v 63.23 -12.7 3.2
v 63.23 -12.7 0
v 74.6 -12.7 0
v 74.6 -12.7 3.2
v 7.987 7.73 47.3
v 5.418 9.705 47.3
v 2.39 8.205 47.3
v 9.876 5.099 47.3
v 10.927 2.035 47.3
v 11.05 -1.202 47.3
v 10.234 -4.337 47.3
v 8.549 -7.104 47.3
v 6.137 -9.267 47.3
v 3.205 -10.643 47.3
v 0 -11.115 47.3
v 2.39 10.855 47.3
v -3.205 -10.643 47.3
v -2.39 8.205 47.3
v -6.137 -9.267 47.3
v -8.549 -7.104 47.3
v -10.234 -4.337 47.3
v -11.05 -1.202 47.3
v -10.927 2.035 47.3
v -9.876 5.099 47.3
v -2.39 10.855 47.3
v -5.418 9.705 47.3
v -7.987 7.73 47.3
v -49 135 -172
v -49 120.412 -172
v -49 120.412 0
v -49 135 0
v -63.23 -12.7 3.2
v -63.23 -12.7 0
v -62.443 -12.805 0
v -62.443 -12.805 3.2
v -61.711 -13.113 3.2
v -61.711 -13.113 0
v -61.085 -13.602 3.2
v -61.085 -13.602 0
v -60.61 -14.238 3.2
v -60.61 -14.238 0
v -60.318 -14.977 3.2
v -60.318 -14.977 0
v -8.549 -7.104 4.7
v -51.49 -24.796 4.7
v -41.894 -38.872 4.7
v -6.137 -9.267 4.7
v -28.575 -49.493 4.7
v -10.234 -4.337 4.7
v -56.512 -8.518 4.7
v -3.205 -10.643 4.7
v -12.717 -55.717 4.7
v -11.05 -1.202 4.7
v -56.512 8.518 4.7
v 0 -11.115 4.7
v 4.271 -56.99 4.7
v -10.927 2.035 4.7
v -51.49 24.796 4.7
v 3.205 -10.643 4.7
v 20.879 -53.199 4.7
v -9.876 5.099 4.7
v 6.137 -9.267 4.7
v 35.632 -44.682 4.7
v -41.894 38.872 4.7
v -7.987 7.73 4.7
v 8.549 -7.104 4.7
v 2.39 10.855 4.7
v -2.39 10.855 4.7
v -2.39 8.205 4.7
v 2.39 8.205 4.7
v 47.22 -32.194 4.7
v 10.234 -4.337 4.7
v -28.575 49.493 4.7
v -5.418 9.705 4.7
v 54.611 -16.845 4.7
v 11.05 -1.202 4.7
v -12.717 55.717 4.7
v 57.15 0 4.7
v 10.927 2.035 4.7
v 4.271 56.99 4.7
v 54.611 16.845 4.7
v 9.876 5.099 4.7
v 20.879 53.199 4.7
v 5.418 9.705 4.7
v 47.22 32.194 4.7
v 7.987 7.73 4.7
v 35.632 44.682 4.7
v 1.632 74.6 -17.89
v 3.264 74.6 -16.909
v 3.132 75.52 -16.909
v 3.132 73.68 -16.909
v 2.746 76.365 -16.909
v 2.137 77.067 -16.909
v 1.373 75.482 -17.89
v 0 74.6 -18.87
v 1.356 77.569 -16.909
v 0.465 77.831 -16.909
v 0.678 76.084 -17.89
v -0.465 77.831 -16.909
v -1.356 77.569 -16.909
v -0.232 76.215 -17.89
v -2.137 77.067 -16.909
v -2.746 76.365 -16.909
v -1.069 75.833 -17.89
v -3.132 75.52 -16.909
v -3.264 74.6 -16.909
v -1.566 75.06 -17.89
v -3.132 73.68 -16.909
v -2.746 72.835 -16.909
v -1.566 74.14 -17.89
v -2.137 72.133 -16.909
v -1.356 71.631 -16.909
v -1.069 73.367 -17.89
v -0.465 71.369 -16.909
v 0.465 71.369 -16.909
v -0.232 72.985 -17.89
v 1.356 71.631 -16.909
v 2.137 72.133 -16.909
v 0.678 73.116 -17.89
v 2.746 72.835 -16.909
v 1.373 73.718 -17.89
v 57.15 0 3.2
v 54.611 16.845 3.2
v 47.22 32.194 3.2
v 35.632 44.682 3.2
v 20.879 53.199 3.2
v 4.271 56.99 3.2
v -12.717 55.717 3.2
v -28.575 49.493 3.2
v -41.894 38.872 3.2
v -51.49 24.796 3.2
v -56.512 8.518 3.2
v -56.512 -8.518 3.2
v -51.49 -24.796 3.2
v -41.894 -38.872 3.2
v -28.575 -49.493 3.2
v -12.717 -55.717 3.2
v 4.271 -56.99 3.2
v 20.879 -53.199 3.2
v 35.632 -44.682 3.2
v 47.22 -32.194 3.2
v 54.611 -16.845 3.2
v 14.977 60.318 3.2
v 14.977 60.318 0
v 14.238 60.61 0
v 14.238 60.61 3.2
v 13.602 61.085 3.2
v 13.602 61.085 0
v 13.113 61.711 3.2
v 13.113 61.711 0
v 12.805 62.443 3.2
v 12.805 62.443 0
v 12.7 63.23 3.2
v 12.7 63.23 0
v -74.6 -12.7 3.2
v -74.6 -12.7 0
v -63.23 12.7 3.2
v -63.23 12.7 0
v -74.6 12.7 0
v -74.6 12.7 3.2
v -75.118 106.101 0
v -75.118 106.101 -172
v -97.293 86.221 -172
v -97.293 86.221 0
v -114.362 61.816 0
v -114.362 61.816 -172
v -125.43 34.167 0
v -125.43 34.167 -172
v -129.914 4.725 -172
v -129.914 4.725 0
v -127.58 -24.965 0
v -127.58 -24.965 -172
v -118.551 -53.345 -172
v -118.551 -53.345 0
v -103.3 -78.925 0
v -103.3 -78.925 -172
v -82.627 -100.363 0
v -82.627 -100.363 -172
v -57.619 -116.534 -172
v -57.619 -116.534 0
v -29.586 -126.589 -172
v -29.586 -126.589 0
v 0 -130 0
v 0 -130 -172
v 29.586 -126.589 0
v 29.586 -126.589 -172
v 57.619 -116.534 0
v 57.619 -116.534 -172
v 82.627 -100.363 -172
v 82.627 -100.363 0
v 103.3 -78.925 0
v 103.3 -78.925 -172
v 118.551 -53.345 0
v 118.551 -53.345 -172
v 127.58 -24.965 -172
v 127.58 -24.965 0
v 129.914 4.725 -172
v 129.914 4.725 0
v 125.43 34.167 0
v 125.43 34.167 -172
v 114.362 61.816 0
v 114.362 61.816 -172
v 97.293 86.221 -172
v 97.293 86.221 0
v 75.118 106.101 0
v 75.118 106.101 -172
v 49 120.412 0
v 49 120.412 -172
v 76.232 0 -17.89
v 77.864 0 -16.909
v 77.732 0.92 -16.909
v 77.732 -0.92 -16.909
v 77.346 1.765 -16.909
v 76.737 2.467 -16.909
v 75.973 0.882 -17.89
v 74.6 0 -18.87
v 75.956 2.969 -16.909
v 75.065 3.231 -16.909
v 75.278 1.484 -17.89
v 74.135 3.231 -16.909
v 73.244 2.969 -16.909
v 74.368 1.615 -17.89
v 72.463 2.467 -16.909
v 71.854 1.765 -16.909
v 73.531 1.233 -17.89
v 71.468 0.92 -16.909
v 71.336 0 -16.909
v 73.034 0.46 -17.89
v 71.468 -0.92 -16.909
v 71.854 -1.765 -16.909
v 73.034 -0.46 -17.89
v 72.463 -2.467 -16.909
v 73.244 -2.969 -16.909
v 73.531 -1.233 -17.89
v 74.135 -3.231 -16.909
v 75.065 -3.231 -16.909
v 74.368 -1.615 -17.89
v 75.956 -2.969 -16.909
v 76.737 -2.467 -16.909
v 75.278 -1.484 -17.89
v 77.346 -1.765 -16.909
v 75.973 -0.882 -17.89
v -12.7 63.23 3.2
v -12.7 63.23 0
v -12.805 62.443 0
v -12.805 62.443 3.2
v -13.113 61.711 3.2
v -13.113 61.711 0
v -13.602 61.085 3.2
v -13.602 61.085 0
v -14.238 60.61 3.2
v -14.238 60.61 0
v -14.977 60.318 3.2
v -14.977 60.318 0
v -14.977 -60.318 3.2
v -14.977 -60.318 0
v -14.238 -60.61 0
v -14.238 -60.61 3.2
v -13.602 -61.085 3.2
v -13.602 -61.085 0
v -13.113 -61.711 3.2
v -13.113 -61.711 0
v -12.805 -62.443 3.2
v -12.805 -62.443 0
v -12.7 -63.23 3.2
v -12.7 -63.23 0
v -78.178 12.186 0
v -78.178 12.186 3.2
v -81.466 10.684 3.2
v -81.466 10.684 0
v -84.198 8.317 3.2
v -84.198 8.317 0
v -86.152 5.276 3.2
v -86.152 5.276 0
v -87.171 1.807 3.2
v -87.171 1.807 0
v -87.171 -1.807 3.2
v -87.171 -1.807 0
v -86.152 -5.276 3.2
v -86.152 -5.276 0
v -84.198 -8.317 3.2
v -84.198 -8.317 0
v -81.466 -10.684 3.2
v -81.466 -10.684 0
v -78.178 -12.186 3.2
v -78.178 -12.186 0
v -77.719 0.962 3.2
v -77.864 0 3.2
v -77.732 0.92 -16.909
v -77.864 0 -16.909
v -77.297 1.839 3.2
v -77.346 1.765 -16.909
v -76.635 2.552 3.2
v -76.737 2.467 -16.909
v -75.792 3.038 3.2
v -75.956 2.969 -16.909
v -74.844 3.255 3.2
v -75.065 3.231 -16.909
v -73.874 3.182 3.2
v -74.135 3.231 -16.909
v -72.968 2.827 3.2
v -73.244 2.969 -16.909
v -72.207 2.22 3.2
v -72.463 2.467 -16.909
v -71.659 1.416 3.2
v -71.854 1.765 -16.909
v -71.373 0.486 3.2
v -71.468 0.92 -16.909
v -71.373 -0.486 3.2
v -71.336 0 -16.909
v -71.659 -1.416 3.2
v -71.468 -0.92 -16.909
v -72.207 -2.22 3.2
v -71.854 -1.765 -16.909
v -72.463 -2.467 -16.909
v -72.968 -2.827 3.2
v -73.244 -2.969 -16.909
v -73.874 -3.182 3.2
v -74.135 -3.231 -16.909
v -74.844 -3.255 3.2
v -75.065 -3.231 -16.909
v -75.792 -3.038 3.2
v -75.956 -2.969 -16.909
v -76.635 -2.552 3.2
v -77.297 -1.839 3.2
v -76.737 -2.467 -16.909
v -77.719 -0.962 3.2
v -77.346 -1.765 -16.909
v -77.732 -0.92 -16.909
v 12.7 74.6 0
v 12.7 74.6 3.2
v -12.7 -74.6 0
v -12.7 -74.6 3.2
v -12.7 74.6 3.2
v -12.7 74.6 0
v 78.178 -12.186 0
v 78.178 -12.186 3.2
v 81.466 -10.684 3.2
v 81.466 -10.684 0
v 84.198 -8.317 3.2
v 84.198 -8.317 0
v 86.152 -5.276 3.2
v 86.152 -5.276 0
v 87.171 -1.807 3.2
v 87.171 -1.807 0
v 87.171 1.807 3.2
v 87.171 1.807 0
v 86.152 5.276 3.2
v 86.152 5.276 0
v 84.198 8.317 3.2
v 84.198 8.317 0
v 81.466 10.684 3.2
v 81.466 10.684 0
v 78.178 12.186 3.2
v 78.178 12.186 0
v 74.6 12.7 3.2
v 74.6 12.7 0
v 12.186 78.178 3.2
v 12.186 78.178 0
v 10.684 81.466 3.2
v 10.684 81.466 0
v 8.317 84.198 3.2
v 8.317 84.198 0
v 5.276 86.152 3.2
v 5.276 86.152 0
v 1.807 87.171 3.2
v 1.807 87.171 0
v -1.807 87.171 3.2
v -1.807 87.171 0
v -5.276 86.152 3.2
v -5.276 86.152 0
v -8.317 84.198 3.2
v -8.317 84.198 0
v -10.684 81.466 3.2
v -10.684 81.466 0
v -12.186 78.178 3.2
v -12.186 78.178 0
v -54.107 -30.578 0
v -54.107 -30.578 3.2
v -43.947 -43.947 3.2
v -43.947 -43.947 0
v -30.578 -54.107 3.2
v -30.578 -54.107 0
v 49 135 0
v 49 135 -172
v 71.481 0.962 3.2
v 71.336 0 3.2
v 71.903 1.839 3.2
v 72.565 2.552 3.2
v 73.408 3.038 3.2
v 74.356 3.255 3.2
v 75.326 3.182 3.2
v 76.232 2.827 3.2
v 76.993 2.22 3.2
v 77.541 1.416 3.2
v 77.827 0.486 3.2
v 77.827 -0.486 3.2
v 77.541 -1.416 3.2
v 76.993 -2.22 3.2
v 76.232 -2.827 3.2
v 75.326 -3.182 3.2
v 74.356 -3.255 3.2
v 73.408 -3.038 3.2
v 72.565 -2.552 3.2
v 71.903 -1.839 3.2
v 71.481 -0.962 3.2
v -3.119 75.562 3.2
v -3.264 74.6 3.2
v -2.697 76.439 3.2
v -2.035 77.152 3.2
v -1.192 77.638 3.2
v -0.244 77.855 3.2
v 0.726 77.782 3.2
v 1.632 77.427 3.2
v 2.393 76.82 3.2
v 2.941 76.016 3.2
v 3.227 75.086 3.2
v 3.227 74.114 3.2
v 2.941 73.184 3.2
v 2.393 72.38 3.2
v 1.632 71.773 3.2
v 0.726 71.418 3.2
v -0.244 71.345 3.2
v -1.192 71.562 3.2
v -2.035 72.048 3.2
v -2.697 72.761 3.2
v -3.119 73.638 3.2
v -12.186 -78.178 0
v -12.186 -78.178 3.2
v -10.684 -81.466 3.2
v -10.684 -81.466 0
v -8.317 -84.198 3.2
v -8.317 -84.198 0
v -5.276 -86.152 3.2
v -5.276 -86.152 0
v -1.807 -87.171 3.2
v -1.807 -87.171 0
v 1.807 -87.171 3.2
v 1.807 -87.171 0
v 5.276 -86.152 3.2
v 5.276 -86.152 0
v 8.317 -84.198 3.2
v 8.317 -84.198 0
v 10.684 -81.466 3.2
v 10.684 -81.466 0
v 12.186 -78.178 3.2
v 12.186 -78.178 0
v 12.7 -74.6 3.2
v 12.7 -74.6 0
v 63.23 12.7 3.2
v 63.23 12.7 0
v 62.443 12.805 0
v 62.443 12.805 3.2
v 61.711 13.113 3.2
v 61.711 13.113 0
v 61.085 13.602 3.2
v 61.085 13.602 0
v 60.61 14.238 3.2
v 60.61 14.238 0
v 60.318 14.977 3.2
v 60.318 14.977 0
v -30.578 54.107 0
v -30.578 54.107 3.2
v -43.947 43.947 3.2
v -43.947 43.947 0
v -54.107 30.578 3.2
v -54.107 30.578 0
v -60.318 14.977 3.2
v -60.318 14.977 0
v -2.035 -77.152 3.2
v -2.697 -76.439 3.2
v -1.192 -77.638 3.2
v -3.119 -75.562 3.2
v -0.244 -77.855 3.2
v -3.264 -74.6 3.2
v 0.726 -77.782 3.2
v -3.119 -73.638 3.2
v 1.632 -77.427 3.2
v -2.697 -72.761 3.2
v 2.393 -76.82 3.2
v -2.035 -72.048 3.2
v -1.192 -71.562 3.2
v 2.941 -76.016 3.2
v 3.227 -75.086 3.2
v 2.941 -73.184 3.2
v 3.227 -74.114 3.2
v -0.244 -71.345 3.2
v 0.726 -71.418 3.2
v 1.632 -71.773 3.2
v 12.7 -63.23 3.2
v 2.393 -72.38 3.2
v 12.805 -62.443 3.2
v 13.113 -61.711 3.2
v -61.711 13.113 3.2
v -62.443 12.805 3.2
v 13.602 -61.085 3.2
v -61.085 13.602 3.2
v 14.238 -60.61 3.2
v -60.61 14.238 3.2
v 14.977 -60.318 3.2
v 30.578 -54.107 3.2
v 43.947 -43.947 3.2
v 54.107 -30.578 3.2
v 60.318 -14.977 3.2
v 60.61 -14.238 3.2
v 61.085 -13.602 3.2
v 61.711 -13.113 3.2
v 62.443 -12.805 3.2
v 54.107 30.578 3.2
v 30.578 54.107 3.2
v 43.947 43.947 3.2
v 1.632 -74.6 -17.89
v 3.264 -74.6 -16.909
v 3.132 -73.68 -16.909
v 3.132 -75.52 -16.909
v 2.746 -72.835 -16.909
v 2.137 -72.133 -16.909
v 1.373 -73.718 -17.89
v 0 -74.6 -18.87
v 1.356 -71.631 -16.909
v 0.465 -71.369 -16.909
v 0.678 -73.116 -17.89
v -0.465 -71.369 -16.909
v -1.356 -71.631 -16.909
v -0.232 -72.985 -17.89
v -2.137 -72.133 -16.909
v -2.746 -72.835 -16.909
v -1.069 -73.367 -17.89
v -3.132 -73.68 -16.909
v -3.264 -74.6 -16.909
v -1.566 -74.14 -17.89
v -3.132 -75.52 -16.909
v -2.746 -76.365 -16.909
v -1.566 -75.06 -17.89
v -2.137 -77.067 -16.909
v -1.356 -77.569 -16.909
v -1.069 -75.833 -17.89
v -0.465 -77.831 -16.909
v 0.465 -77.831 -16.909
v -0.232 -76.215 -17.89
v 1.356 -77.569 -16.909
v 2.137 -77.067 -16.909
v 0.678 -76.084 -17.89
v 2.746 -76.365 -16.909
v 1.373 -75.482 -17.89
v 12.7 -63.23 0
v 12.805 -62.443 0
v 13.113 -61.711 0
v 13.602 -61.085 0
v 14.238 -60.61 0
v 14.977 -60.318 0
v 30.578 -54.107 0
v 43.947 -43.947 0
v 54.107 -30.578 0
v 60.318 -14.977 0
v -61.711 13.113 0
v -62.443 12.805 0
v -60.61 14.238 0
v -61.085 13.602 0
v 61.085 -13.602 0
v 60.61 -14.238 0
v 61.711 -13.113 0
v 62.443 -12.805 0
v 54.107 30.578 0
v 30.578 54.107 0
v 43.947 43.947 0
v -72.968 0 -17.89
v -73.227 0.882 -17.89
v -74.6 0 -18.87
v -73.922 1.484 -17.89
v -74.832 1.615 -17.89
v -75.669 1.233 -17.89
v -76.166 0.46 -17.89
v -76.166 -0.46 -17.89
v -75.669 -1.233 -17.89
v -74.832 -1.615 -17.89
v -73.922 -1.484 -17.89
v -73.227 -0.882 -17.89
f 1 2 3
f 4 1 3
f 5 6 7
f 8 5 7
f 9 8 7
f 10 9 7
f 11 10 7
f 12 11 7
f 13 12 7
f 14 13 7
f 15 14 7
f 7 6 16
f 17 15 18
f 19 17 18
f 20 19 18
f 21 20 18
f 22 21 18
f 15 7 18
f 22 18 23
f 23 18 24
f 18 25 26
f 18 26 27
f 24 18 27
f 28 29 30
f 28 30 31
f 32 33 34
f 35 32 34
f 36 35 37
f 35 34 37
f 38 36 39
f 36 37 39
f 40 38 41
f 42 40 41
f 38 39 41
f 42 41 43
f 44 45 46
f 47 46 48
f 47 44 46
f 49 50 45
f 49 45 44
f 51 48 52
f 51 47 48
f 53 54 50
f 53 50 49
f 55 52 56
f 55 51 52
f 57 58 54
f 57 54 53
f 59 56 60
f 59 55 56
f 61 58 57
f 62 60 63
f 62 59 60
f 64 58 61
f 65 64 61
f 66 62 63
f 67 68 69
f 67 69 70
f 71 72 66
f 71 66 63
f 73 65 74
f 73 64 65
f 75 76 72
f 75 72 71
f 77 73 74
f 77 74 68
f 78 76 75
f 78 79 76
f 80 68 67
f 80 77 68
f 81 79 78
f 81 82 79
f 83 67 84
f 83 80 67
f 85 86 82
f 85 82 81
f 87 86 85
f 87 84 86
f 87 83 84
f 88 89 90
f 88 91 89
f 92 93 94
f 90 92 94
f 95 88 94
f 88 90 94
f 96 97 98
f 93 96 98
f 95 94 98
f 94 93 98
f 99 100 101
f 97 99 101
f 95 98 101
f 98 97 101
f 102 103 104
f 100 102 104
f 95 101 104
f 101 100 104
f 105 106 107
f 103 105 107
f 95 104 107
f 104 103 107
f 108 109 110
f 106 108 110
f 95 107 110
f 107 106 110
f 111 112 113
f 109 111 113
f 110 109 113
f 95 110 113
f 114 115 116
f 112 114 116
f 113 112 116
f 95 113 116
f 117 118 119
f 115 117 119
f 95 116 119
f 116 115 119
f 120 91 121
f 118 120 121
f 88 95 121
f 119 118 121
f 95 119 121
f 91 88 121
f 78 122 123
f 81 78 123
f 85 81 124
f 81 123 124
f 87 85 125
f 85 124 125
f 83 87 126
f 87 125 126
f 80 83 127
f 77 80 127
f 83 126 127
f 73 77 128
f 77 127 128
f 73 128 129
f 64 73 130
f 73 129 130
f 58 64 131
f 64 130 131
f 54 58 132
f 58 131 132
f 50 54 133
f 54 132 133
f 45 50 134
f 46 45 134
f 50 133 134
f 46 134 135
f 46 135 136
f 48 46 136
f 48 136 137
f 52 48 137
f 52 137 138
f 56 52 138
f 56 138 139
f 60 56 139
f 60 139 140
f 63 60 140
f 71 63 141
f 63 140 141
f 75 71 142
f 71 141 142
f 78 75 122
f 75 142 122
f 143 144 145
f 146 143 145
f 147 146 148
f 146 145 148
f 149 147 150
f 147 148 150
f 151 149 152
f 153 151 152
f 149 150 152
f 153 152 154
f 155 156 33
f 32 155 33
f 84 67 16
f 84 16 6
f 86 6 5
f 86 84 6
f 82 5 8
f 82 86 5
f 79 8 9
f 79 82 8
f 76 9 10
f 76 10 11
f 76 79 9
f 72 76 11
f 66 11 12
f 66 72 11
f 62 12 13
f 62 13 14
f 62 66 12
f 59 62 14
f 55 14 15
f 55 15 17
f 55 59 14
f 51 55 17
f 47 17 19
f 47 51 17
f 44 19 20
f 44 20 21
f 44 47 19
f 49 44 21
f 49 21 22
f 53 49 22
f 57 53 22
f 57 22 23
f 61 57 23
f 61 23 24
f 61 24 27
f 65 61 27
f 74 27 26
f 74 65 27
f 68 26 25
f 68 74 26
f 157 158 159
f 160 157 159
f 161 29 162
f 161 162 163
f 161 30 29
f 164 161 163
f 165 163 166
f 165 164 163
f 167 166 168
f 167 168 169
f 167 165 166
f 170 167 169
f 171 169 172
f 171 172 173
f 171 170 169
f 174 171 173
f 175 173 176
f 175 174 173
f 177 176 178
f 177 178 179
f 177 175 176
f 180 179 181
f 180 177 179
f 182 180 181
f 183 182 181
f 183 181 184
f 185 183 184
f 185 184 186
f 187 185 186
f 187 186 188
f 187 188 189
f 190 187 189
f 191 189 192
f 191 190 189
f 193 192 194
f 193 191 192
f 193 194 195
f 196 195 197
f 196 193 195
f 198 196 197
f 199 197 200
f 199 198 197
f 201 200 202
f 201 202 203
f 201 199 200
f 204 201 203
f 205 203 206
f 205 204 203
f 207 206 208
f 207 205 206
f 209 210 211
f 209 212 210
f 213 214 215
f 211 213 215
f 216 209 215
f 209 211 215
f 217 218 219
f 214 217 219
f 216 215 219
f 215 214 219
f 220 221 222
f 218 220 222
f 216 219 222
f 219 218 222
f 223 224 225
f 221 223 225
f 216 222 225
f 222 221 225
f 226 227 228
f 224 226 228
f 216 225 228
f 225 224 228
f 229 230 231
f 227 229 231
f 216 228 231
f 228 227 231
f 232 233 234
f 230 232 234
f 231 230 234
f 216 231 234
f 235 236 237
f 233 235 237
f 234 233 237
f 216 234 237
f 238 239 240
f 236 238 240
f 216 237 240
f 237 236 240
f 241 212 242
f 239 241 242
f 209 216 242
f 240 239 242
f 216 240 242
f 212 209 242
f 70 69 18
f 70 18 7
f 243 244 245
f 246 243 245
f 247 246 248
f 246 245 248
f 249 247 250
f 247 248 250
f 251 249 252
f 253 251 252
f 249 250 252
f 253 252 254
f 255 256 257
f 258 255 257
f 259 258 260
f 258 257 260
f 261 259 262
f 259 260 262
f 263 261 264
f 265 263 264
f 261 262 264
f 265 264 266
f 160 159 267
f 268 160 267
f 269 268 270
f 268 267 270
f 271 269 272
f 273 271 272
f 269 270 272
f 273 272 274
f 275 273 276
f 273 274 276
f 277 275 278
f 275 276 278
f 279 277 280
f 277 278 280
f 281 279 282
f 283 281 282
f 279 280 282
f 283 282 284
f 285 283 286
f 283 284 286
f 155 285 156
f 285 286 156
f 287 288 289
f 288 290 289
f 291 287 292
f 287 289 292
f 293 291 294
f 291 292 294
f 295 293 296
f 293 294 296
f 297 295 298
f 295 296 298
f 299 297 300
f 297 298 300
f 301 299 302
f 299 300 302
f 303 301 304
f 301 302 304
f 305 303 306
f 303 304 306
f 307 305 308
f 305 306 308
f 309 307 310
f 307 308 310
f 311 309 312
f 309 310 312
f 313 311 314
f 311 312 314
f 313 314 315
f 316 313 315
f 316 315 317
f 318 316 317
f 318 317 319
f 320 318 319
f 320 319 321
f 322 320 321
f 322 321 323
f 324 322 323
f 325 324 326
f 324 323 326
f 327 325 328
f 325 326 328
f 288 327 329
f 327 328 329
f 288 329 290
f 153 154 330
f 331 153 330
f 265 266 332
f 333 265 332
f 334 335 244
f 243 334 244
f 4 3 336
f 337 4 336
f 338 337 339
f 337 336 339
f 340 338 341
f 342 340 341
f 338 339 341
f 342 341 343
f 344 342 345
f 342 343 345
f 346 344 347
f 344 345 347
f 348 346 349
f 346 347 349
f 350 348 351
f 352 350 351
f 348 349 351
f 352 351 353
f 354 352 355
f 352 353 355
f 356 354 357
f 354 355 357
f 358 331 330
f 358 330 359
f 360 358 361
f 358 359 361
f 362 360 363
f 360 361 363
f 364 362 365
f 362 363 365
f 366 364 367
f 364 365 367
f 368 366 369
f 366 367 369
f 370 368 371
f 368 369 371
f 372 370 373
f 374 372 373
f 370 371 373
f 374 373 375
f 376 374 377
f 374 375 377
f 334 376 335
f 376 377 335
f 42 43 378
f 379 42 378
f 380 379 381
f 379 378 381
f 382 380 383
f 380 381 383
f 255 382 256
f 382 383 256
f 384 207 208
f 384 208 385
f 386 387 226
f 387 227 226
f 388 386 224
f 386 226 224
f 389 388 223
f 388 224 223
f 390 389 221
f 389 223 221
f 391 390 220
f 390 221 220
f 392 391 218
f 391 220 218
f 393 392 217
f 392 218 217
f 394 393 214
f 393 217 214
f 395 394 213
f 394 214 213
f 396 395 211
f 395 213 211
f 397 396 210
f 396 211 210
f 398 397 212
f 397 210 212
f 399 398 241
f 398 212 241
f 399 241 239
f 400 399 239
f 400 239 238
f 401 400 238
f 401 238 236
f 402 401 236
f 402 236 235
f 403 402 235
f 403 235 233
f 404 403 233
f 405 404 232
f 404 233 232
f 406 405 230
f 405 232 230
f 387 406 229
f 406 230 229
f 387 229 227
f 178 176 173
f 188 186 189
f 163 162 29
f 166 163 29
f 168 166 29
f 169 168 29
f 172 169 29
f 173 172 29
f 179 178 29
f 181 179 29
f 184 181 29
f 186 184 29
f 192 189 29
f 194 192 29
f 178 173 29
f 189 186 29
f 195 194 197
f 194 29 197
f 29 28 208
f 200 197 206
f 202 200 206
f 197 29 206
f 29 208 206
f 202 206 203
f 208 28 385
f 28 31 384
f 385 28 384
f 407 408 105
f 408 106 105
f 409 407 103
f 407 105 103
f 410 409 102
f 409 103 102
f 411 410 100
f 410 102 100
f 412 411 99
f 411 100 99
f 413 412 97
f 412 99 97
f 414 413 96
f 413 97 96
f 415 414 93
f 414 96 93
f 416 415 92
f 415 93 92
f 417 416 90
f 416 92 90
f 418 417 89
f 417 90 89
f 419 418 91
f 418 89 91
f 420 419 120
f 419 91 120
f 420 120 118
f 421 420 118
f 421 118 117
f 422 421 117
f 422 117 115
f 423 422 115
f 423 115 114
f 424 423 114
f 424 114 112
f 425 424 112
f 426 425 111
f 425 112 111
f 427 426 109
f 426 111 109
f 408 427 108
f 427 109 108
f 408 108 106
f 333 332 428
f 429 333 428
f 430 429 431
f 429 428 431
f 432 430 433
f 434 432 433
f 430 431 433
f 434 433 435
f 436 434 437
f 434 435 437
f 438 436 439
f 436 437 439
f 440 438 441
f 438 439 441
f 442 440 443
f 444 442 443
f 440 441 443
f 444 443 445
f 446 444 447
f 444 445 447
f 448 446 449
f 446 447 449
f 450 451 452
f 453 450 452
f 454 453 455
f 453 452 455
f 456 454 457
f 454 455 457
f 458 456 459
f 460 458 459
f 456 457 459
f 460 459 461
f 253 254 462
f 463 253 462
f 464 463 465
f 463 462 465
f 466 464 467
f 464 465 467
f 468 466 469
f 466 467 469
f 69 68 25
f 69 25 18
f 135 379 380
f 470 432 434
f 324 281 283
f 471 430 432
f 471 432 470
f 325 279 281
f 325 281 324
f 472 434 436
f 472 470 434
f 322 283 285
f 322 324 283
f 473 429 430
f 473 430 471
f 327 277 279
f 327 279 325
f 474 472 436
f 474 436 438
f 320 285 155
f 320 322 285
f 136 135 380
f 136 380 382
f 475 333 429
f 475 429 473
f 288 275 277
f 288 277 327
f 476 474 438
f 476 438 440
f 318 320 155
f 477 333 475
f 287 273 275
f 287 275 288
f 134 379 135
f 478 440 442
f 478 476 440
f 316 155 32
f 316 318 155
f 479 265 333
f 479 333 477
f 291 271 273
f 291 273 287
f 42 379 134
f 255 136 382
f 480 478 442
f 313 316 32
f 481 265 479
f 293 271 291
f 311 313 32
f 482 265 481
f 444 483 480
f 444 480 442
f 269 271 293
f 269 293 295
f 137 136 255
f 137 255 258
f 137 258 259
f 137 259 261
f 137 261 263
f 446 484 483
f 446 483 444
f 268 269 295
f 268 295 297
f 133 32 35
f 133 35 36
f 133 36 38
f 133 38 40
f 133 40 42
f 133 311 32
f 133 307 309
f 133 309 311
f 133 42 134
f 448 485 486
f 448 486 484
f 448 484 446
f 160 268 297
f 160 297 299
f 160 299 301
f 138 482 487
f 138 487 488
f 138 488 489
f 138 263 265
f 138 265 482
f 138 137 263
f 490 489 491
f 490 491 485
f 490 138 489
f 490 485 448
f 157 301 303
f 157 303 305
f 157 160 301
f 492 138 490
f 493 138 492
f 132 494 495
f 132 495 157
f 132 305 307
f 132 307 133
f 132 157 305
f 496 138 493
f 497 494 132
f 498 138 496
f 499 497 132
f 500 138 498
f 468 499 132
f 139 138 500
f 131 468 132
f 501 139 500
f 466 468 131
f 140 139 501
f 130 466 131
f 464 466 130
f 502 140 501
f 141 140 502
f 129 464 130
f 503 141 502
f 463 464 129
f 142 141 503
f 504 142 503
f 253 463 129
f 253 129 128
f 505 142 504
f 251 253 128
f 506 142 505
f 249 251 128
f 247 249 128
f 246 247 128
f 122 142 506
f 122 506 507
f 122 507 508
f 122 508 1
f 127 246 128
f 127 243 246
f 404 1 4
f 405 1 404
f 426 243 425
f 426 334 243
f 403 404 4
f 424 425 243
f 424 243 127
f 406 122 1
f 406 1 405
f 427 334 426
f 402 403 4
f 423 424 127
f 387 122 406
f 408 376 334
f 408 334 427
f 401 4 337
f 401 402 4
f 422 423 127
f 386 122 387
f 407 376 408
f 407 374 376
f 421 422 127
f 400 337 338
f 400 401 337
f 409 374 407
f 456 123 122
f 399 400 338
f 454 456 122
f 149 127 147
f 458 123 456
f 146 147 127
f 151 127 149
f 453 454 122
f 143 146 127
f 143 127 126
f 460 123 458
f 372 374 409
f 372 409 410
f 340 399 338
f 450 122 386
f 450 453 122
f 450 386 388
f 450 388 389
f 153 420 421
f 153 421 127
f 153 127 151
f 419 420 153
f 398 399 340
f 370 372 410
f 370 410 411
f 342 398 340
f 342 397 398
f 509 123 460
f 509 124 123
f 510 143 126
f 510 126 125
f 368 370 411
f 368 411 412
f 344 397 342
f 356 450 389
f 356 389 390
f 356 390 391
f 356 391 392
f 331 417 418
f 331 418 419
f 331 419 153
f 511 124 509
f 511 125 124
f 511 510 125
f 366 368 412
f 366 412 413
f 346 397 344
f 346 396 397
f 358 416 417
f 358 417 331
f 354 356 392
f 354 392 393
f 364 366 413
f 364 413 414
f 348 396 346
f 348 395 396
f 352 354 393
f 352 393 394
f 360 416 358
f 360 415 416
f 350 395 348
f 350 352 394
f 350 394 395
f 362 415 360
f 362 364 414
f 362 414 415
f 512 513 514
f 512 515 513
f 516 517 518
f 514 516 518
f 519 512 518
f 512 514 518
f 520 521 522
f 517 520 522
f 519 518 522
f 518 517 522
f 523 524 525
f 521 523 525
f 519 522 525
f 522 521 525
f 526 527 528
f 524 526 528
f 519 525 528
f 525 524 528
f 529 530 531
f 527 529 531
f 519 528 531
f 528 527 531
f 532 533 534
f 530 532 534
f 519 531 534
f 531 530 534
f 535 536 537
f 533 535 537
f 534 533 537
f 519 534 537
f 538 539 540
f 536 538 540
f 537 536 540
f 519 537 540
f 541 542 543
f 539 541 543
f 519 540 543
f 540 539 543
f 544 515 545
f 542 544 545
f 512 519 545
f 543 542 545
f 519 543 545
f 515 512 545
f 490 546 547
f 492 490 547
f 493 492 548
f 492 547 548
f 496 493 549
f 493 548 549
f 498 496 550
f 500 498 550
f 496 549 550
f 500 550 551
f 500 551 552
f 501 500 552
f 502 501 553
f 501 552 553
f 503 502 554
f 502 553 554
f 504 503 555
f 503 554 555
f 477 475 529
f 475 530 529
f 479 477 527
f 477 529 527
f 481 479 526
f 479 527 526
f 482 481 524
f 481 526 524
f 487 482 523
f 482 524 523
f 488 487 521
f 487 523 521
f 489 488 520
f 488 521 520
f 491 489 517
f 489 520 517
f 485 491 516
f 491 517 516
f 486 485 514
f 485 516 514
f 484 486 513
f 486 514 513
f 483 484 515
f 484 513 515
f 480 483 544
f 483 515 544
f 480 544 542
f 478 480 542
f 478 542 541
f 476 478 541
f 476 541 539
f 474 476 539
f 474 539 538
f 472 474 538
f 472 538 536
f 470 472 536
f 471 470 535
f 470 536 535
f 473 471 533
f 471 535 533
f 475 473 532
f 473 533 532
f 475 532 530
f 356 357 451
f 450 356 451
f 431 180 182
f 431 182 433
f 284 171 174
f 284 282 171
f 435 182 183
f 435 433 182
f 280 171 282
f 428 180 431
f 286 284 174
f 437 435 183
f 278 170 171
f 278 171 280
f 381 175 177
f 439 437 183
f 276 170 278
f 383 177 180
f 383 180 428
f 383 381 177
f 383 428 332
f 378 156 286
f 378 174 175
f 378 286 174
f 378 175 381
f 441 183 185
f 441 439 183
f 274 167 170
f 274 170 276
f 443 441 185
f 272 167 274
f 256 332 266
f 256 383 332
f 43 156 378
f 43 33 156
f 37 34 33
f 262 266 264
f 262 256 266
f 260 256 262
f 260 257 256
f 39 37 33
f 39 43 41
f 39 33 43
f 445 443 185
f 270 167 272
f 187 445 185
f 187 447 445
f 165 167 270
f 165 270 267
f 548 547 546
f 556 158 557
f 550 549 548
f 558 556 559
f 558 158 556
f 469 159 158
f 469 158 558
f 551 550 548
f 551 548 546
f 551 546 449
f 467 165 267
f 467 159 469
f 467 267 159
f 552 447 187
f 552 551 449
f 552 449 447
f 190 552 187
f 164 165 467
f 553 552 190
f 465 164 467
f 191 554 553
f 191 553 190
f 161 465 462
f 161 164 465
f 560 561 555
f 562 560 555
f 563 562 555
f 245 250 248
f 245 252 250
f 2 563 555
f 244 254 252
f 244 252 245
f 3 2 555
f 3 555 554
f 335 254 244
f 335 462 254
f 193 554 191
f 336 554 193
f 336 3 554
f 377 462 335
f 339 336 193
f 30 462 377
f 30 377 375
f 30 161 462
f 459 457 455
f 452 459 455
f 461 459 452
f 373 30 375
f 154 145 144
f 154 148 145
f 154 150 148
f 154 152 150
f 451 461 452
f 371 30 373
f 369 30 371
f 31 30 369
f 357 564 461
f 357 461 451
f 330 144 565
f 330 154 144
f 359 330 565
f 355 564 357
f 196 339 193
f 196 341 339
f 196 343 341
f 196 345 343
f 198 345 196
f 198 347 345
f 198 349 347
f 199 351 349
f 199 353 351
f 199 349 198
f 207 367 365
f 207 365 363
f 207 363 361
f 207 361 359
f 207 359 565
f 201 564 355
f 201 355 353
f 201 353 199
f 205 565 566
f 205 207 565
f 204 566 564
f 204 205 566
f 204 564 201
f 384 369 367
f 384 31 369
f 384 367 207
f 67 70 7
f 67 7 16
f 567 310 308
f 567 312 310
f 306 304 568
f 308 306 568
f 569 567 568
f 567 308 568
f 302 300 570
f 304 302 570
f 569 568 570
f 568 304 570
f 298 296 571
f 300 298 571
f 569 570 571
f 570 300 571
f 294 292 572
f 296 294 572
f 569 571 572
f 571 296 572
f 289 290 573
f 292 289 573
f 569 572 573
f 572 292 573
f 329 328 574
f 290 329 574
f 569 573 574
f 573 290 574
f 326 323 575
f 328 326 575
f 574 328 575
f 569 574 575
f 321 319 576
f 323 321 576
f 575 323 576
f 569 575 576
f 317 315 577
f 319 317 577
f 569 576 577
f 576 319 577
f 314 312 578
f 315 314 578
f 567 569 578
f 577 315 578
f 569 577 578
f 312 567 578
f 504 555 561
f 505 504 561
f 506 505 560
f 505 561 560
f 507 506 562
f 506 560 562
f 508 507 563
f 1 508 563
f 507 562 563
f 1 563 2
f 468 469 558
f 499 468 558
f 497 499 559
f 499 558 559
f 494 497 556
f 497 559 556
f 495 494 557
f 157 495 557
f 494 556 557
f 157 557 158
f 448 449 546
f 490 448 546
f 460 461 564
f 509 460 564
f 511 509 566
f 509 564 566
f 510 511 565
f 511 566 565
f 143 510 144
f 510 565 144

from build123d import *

# Parameters (mm, degrees)
SKETCH1_R                    = 130
BOSS_EXTRUDE1_DEPTH          = 172
BOSS_EXTRUDE2_DEPTH          = 3.2
SKETCH3_R                    = 57.15
BOSS_EXTRUDE3_DEPTH          = 1.5
F_5_16_18_TAPPED_HOLE1_D     = 6.5278
F_5_16_18_TAPPED_HOLE1_DEPTH = 20.1091
F_5_16_18_TAPPED_HOLE1_TIP   = 1.961148974
SKETCH6_W                    = 98
SKETCH6_H                    = 47.7
BOSS_EXTRUDE4_DEPTH          = 172
BOSS_EXTRUDE5_DEPTH          = 42.6


with BuildPart() as part:
    # Sketch1 → Boss-Extrude1 (new body)
    with BuildSketch(Plane.XY):
        Circle(SKETCH1_R)
    extrude(amount=-BOSS_EXTRUDE1_DEPTH)

    # Sketch2 → Boss-Extrude2 (add)
    with BuildSketch(Plane.XY):
        with BuildLine():
            Line((-63.229996837, 12.7), (-74.6, 12.7))
            ThreePointArc((-74.6, 12.7), (-87.3, 0), (-74.6, -12.7))
            Line((-74.6, -12.7), (-63.229996837, -12.7))
            ThreePointArc((-63.229996837, -12.7), (-61.381868207, -13.336862135), (-60.318408341, -14.977052955))
            ThreePointArc((-60.318408341, -14.977052955), (-43.946686451, -43.946686451), (-14.977052955, -60.318408341))
            ThreePointArc((-14.977052955, -60.318408341), (-13.336862135, -61.381868207), (-12.7, -63.229996837))
            Line((-12.7, -63.229996837), (-12.7, -74.6))
            ThreePointArc((-12.7, -74.6), (0, -87.3), (12.7, -74.6))
            Line((12.7, -74.6), (12.7, -63.229996837))
            ThreePointArc((12.7, -63.229996837), (13.336862135, -61.381868207), (14.977052955, -60.318408341))
            ThreePointArc((14.977052955, -60.318408341), (43.946686451, -43.946686451), (60.318408341, -14.977052955))
            ThreePointArc((60.318408341, -14.977052955), (61.381868207, -13.336862135), (63.229996837, -12.7))
            Line((63.229996837, -12.7), (74.6, -12.7))
            ThreePointArc((74.6, -12.7), (87.3, 0), (74.6, 12.7))
            Line((74.6, 12.7), (63.229996837, 12.7))
            ThreePointArc((63.229996837, 12.7), (61.381868207, 13.336862135), (60.318408341, 14.977052955))
            ThreePointArc((60.318408341, 14.977052955), (43.946686451, 43.946686451), (14.977052955, 60.318408341))
            ThreePointArc((14.977052955, 60.318408341), (13.336862135, 61.381868207), (12.7, 63.229996837))
            Line((12.7, 63.229996837), (12.7, 74.6))
            ThreePointArc((12.7, 74.6), (0, 87.3), (-12.7, 74.6))
            Line((-12.7, 74.6), (-12.7, 63.229996837))
            ThreePointArc((-12.7, 63.229996837), (-13.336862135, 61.381868207), (-14.977052955, 60.318408341))
            ThreePointArc((-14.977052955, 60.318408341), (-43.946686451, 43.946686451), (-60.318408341, 14.977052955))
            ThreePointArc((-60.318408341, 14.977052955), (-61.381868207, 13.336862135), (-63.229996837, 12.7))
        make_face()
    extrude(amount=BOSS_EXTRUDE2_DEPTH)

    # Sketch3 → Boss-Extrude3 (add)
    with BuildSketch(Plane.XY.offset(3.2)):
        Circle(SKETCH3_R)
    extrude(amount=BOSS_EXTRUDE3_DEPTH)

    # 5/16-18 Tapped Hole1
    with Locations(Plane.XY.offset(3.2)):
        with Locations((-74.6, 0), (0, 74.6), (74.6, 0), (0, -74.6)):
            Hole(F_5_16_18_TAPPED_HOLE1_D / 2, depth=F_5_16_18_TAPPED_HOLE1_DEPTH)
            with Locations((0, 0, -(F_5_16_18_TAPPED_HOLE1_DEPTH + F_5_16_18_TAPPED_HOLE1_TIP / 2))):  # 118° drill point
                Cone(0, F_5_16_18_TAPPED_HOLE1_D / 2, F_5_16_18_TAPPED_HOLE1_TIP, mode=Mode.SUBTRACT)

    # Sketch6 → Boss-Extrude4 (add)
    with BuildSketch(Plane.XY):
        with Locations((0, 111.15)):
            Rectangle(SKETCH6_W, SKETCH6_H)
    extrude(amount=-BOSS_EXTRUDE4_DEPTH)

    # Sketch7 → Boss-Extrude5 (add)
    with BuildSketch(Plane.XY.offset(4.7)):
        with BuildLine():
            Line((-2.39, 10.855004606), (-2.39, 8.205004606))
            Line((-2.39, 8.205004606), (2.39, 8.205004606))
            Line((2.39, 8.205004606), (2.39, 10.855004606))
            ThreePointArc((2.39, 10.855004606), (0, -11.115), (-2.39, 10.855004606))
        make_face()
    extrude(amount=BOSS_EXTRUDE5_DEPTH)


solid = part.part
